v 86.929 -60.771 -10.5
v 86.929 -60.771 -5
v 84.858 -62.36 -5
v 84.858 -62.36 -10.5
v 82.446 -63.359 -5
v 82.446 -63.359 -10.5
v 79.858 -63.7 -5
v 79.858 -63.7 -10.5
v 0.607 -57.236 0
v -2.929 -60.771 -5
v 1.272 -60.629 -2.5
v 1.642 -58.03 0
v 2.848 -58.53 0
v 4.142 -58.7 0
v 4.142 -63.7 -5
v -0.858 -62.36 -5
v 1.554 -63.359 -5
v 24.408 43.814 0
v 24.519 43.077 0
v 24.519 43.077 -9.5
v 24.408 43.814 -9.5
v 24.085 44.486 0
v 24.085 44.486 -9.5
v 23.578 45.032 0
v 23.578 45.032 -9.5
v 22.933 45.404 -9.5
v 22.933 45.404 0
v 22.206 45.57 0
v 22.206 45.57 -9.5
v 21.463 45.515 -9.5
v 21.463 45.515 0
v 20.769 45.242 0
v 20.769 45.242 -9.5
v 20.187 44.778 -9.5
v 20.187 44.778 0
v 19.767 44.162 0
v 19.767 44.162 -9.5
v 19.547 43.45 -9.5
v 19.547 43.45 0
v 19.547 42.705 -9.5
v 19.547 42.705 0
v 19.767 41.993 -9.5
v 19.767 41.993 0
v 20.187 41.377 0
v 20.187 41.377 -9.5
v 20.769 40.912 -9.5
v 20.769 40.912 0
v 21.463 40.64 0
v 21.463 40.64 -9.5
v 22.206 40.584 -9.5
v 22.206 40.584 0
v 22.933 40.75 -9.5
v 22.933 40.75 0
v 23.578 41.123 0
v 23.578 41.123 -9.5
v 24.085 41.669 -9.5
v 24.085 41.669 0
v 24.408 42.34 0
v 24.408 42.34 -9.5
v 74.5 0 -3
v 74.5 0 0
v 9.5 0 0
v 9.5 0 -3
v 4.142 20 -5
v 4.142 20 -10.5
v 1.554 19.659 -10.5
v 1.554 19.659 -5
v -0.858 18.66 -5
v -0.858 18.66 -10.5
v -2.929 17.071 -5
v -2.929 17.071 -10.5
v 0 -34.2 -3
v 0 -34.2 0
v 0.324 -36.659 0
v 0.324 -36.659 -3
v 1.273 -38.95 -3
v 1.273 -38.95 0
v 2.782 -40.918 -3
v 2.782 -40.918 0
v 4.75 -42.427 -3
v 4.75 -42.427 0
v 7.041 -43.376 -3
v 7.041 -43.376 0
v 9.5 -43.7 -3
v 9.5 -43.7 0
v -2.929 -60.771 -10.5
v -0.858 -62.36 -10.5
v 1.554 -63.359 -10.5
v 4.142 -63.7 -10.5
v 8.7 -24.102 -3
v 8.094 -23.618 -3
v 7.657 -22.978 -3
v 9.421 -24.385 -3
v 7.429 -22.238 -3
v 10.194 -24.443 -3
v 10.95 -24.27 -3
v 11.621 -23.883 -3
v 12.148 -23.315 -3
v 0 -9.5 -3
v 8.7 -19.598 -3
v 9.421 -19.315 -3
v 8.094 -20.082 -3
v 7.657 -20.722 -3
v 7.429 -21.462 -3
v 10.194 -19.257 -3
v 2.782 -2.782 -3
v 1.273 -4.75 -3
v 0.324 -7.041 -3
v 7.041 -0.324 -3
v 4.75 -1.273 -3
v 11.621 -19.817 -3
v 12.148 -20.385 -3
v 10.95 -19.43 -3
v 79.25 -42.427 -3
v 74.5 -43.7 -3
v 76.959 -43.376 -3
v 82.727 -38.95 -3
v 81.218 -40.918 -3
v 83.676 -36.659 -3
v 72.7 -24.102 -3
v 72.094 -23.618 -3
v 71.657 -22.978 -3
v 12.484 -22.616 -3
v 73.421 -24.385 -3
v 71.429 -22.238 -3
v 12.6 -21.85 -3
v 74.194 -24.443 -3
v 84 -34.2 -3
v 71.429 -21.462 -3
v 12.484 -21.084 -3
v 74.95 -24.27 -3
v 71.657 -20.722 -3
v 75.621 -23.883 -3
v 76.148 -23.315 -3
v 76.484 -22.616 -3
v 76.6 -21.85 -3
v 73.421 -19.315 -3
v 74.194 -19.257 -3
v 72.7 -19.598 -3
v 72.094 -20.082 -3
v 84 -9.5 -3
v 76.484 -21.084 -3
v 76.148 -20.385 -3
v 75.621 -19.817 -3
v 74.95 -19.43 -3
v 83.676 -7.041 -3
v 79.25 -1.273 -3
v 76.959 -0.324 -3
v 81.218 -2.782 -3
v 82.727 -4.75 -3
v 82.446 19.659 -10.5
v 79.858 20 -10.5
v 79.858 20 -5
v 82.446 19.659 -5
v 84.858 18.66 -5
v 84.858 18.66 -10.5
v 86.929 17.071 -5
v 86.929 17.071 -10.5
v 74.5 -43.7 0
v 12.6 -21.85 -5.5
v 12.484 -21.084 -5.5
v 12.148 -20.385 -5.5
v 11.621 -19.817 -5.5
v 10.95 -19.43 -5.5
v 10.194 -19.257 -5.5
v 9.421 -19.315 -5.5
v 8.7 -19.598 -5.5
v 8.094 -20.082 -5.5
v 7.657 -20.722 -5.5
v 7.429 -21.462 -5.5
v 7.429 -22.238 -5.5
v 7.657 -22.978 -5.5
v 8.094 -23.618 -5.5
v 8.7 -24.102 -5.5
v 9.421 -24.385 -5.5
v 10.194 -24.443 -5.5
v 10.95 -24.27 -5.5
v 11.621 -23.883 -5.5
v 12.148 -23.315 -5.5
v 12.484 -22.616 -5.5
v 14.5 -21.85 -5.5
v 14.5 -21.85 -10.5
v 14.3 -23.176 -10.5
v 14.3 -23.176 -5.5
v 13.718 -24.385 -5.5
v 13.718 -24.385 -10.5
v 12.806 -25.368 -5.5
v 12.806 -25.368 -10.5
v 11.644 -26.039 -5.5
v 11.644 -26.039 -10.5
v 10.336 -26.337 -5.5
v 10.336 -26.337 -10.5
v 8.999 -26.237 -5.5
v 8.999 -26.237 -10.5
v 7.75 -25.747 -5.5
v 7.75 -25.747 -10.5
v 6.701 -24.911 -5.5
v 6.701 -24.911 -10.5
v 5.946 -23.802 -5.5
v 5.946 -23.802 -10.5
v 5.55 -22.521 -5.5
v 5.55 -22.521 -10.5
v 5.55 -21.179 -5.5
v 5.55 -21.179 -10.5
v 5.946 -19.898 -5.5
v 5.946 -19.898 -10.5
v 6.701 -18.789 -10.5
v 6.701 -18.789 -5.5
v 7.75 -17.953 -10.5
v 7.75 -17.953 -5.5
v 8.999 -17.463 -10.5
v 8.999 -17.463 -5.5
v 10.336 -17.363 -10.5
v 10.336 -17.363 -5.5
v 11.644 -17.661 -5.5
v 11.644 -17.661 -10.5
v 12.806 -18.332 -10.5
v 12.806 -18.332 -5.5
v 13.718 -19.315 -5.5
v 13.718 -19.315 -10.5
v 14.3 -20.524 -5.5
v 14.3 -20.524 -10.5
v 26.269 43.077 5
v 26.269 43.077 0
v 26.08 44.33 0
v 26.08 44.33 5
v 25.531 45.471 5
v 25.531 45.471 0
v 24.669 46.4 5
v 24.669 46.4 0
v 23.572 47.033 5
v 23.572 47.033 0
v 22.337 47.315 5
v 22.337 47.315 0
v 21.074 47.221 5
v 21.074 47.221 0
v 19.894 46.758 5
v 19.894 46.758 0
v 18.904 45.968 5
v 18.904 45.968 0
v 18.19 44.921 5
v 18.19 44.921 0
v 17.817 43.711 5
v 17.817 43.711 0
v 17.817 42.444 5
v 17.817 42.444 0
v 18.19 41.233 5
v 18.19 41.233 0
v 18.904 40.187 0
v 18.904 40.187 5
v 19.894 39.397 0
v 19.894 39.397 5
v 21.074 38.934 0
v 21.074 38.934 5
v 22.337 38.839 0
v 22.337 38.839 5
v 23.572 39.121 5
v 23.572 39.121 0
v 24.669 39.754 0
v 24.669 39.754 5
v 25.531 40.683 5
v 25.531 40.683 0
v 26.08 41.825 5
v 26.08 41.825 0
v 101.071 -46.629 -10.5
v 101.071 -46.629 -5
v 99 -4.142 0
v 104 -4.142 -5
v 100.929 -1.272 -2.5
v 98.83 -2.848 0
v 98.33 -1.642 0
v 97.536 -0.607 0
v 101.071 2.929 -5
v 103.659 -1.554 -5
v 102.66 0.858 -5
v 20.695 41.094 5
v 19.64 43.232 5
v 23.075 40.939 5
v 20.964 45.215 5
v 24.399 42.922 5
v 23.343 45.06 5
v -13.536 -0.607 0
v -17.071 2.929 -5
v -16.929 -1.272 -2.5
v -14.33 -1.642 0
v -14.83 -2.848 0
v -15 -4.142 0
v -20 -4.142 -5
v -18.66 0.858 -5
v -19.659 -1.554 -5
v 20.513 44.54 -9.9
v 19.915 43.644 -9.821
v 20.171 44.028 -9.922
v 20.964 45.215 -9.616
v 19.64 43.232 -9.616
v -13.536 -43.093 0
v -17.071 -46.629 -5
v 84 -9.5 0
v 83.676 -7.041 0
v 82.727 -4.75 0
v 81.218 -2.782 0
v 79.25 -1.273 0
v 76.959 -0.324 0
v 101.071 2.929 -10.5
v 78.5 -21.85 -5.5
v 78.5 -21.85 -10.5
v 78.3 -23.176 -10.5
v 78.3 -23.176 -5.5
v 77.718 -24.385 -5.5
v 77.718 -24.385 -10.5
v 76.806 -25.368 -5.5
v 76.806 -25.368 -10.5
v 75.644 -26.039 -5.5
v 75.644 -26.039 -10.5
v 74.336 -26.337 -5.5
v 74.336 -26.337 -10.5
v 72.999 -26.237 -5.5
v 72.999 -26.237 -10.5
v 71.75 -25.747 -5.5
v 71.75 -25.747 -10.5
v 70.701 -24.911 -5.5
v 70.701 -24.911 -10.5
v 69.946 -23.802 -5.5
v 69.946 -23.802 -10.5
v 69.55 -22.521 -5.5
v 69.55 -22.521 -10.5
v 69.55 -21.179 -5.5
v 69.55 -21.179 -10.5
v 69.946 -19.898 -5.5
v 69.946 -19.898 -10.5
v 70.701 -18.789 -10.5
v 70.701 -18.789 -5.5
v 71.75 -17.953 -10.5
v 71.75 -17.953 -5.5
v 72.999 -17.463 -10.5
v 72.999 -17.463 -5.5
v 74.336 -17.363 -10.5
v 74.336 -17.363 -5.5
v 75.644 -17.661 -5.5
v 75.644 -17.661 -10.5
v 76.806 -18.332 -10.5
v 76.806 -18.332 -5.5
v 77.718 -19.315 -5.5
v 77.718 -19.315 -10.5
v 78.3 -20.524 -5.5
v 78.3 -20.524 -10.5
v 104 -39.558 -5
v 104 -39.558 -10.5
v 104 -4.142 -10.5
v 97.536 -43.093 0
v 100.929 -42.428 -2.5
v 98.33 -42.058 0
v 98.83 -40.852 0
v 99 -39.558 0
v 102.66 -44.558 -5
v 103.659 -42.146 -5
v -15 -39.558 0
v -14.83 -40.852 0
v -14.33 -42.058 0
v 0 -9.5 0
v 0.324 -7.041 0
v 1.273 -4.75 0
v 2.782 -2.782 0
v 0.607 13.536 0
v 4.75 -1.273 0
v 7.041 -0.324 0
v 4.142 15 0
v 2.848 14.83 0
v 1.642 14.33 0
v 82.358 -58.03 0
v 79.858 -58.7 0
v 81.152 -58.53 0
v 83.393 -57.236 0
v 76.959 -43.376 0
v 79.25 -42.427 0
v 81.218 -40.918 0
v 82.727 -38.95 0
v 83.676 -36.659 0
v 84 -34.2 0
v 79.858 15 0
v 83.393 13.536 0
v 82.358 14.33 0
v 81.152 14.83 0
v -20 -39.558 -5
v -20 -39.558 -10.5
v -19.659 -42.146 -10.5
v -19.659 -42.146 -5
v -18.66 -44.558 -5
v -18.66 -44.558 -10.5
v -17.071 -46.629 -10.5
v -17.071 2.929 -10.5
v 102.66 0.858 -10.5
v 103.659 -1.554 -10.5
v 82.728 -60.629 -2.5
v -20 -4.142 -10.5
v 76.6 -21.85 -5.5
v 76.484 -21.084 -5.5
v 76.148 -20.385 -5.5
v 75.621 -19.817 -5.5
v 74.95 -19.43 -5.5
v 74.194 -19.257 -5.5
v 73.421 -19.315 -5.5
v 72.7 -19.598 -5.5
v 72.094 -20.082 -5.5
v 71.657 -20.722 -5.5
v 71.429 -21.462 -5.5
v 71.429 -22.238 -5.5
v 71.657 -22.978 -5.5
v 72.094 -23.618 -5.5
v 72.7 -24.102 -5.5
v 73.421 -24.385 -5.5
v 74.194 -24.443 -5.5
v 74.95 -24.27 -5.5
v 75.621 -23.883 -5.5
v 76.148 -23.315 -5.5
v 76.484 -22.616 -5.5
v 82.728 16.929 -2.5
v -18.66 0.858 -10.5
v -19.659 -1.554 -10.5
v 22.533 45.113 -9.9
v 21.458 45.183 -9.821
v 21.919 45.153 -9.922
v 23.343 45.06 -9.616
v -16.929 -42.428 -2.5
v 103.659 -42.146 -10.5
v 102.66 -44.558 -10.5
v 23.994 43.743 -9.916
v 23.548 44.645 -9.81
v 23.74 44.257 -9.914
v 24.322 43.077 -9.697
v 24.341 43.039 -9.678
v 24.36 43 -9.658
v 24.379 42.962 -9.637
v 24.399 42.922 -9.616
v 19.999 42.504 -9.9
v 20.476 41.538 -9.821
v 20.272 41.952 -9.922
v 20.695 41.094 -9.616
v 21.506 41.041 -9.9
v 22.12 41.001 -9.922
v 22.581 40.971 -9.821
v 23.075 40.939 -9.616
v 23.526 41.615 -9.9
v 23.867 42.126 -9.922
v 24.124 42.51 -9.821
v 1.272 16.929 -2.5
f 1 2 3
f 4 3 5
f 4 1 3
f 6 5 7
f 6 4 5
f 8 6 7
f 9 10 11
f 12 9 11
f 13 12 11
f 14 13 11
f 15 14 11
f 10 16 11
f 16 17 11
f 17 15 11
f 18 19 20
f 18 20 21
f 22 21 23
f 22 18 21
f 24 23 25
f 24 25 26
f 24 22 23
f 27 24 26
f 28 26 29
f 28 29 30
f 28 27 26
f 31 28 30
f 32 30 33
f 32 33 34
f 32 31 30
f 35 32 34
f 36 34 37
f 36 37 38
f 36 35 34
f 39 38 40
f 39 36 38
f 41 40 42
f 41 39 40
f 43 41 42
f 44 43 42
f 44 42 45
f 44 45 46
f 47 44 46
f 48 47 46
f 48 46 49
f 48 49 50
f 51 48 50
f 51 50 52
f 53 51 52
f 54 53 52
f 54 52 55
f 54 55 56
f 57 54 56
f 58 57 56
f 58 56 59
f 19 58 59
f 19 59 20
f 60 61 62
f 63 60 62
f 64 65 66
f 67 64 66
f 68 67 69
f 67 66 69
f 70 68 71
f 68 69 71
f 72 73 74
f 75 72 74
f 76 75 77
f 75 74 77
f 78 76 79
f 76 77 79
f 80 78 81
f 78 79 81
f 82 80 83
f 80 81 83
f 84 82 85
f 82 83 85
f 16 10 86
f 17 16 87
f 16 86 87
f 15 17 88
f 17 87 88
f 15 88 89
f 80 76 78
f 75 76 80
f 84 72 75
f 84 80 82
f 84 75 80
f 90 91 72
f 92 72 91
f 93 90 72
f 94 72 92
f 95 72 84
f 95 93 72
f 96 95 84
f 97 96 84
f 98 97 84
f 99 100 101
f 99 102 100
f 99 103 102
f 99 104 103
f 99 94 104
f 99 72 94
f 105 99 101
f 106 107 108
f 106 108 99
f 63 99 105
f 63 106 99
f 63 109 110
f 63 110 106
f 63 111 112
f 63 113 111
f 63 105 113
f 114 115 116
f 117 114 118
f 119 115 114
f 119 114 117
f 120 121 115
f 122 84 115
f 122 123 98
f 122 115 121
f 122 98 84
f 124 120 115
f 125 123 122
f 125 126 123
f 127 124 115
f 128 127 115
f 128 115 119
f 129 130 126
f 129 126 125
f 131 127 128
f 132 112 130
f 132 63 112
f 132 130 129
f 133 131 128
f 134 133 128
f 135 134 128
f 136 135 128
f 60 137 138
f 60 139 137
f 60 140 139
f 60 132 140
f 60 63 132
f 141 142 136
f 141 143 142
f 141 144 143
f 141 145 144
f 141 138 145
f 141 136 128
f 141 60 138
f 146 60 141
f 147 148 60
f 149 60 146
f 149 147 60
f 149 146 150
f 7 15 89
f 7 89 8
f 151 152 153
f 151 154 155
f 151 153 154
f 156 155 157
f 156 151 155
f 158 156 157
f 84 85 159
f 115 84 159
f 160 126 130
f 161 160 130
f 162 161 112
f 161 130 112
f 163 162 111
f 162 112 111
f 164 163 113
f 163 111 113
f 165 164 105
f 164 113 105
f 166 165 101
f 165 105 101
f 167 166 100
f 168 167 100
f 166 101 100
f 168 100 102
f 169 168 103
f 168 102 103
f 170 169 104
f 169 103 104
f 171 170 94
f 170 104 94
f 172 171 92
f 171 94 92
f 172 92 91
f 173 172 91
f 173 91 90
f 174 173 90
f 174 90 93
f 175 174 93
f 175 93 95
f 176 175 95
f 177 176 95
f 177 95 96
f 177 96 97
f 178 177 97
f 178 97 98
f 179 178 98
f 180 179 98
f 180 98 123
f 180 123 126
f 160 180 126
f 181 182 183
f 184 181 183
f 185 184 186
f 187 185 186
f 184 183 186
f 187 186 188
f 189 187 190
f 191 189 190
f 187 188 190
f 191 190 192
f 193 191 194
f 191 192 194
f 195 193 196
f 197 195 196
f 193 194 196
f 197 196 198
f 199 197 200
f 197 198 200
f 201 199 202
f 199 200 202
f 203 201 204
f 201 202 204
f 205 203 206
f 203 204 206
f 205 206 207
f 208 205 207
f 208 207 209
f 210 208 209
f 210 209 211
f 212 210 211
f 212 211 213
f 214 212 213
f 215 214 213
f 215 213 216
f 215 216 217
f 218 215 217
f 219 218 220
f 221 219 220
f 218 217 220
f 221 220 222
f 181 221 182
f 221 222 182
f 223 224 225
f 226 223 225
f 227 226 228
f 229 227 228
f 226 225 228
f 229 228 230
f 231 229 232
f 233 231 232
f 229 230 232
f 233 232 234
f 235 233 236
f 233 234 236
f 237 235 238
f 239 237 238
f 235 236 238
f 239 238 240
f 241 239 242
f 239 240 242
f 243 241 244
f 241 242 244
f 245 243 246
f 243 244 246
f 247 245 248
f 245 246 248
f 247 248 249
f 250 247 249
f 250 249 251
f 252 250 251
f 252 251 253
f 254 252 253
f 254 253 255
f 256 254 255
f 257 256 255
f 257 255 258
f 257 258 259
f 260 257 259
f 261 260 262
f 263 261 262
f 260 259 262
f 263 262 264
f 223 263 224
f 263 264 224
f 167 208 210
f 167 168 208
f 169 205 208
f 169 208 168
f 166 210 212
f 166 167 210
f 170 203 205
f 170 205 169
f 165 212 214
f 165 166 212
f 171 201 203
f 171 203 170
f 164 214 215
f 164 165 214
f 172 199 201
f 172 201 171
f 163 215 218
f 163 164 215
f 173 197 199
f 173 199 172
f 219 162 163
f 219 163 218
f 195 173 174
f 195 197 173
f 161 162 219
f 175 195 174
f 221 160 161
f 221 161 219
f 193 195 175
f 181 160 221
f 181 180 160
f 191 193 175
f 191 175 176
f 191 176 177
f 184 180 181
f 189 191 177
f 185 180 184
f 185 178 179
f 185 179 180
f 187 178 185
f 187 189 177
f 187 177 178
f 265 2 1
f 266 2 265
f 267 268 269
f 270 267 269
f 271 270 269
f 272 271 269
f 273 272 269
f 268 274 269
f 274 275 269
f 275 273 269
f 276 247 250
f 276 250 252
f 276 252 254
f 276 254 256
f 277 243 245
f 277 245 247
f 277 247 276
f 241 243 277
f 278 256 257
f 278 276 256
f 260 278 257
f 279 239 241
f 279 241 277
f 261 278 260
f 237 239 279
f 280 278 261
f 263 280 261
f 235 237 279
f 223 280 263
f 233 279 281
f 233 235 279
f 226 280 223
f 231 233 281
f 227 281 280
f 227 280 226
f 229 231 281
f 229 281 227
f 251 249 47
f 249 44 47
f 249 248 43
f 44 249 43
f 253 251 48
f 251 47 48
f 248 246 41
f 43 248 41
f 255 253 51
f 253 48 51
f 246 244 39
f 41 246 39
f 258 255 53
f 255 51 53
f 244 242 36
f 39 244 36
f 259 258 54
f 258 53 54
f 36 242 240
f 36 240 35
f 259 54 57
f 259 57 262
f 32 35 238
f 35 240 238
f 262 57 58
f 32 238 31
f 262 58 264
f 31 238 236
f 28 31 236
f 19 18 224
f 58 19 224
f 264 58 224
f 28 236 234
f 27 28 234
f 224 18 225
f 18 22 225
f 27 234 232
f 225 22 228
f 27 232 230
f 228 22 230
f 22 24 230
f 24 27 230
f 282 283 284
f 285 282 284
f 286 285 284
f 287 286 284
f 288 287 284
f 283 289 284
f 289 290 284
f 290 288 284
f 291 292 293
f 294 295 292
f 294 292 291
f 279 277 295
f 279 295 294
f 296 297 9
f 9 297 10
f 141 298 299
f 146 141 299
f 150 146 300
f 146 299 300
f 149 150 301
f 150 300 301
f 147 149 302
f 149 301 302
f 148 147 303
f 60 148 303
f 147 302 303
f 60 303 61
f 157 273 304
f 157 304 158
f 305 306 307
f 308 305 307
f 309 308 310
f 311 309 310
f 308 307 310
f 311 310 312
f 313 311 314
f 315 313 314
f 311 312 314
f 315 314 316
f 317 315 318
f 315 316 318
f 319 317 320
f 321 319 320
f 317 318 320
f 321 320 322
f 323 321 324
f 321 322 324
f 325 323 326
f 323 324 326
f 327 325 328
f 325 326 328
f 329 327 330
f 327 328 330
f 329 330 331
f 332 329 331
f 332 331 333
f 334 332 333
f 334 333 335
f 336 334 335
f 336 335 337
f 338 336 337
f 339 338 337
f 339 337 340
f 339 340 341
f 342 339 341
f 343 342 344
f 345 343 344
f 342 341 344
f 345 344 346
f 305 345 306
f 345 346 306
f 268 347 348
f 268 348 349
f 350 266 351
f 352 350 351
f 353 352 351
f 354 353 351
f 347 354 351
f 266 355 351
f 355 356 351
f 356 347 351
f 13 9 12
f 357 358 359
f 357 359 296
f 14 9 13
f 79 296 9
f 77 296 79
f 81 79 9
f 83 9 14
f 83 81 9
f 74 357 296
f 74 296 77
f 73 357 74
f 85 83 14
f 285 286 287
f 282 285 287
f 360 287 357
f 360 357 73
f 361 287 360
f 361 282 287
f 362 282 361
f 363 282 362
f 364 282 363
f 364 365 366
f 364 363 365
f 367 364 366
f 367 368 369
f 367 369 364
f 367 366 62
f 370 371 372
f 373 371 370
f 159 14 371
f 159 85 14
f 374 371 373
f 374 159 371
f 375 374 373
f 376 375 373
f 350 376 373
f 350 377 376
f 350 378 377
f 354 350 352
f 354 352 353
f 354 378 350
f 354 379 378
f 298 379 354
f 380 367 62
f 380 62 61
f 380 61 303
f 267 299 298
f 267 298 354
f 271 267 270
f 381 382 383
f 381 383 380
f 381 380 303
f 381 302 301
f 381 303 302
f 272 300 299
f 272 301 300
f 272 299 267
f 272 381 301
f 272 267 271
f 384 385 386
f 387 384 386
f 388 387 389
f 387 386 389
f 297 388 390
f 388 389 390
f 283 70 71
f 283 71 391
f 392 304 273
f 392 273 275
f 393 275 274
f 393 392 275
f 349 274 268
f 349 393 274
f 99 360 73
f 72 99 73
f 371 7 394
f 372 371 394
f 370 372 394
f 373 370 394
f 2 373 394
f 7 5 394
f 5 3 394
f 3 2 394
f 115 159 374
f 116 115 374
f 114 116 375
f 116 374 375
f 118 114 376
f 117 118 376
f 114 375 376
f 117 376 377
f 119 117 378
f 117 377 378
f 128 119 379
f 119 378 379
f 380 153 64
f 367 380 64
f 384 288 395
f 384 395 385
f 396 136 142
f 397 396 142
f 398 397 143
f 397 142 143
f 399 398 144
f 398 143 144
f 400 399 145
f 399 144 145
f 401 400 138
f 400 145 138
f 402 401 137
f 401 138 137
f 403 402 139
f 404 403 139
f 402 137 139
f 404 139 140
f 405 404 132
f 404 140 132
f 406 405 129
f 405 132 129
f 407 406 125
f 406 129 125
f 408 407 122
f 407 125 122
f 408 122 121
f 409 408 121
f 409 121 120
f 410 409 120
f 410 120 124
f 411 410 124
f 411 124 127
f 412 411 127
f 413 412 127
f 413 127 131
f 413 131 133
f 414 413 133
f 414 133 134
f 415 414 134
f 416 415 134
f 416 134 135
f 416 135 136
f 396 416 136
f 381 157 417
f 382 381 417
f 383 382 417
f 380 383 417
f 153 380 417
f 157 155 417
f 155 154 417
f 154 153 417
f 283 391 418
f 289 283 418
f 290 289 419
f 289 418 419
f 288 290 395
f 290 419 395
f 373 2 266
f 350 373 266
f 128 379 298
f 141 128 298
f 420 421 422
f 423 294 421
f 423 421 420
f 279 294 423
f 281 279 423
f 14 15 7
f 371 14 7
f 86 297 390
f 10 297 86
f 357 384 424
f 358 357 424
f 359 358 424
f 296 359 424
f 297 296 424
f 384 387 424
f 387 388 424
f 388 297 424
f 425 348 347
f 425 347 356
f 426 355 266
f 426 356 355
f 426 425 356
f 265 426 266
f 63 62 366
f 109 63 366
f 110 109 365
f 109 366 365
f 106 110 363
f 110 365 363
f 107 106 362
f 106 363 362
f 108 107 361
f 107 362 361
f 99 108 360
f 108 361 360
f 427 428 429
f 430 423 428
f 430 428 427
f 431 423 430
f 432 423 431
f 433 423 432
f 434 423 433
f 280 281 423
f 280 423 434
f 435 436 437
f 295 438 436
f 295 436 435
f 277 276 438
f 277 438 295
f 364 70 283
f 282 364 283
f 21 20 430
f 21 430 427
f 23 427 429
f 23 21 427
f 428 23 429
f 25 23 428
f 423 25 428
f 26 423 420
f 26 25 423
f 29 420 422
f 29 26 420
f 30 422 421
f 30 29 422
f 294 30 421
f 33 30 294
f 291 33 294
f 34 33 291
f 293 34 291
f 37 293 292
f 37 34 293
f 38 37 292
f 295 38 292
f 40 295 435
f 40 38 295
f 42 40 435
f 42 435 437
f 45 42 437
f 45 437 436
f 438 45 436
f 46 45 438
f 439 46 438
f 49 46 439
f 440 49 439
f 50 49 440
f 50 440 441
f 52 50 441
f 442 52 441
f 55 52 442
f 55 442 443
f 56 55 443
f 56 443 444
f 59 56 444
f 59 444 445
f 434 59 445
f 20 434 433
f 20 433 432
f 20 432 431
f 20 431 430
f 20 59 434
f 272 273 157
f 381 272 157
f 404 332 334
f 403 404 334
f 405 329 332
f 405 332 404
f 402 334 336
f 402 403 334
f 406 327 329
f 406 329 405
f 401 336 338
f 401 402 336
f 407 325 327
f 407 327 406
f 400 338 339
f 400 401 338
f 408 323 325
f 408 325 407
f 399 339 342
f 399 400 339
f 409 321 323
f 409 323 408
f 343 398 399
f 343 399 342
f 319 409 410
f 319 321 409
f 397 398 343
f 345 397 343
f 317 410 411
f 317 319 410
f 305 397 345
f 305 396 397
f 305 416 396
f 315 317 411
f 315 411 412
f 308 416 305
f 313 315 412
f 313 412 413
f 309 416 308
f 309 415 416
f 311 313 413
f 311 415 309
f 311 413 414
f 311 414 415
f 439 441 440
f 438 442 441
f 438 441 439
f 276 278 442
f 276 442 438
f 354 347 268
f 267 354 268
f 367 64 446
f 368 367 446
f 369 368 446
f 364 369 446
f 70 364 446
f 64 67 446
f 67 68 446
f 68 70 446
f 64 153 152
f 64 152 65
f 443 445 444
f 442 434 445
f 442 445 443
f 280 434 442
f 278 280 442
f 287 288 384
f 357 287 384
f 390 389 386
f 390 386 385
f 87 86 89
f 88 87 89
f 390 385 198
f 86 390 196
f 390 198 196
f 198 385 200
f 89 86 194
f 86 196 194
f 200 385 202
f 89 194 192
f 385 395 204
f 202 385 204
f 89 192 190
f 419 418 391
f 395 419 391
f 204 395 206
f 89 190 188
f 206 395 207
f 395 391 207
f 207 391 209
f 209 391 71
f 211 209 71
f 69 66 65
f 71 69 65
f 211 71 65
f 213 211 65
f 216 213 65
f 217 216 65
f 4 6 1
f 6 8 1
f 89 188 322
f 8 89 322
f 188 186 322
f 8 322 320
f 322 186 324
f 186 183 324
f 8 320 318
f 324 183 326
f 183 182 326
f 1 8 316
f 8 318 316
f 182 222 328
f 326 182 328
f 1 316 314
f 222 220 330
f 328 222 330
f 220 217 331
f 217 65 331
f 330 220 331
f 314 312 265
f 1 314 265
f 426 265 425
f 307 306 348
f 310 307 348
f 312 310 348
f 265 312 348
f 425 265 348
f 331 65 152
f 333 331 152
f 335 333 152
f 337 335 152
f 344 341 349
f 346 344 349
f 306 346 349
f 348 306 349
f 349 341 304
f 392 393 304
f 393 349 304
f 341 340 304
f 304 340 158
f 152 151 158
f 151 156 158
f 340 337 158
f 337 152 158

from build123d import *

# Parameters (mm, degrees)
F0_R     = 2.6
F1_DEPTH = 10.5
F2_DEPTH = 3
F3_R     = 10
F4_SIZE  = 5
F5_R     = 4.5
F6_DEPTH = 5
F0_R_2   = 4.25
F0_R_3   = 2.5
F7_DEPTH = 5
F8_DEPTH = 10


# Not quite as in the source:
# - a fillet or chamfer that OpenCascade refuses, or shapes differently, is made with other operations: its cross-section is extruded or revolved along the edge and cut away or added


with BuildPart() as f1:
    # F0 (on Top) → F1 (new body)
    with BuildSketch(Plane.XY):
        Polygon((84, 20), (0, 20), (-20, 0), (-20, -43.7), (0, -63.7), (84, -63.7), (104, -43.7), (104, 0), align=None)
        with BuildLine():
            Line((74.5, -43.7), (9.5, -43.7))
            ThreePointArc((9.5, -43.7), (2.7824855787, -40.9175144213), (0, -34.2))
            Line((0, -34.2), (0, -9.5))
            ThreePointArc((0, -9.5), (2.7824855787, -2.7824855787), (9.5, 0))
            Line((9.5, 0), (74.5, 0))
            ThreePointArc((74.5, 0), (81.2175144213, -2.7824855787), (84, -9.5))
            Line((84, -9.5), (84, -34.2))
            ThreePointArc((84, -34.2), (81.2175144213, -40.9175144213), (74.5, -43.7))
        make_face(mode=Mode.SUBTRACT)
        with BuildLine():
            ThreePointArc((0, -34.2), (2.7824855787, -40.9175144213), (9.5, -43.7))
            Line((9.5, -43.7), (74.5, -43.7))
            ThreePointArc((74.5, -43.7), (81.2175144213, -40.9175144213), (84, -34.2))
            Line((84, -34.2), (84, -9.5))
            ThreePointArc((84, -9.5), (81.2175144213, -2.7824855787), (74.5, 0))
            Line((74.5, 0), (9.5, 0))
            ThreePointArc((9.5, 0), (2.7824855787, -2.7824855787), (0, -9.5))
            Line((0, -9.5), (0, -34.2))
        make_face()
        with Locations((10, -21.85)):
            Circle(F0_R, mode=Mode.SUBTRACT)
        with Locations((74, -21.85)):
            Circle(F0_R, mode=Mode.SUBTRACT)
    extrude(amount=-F1_DEPTH)

    # F0 (on Top) → F2 (cut)
    with BuildSketch(Plane.XY):
        with BuildLine():
            ThreePointArc((0, -34.2), (2.7824855787, -40.9175144213), (9.5, -43.7))
            Line((9.5, -43.7), (74.5, -43.7))
            ThreePointArc((74.5, -43.7), (81.2175144213, -40.9175144213), (84, -34.2))
            Line((84, -34.2), (84, -9.5))
            ThreePointArc((84, -9.5), (81.2175144213, -2.7824855787), (74.5, 0))
            Line((74.5, 0), (9.5, 0))
            ThreePointArc((9.5, 0), (2.7824855787, -2.7824855787), (0, -9.5))
            Line((0, -9.5), (0, -34.2))
        make_face()
        with Locations((10, -21.85)):
            Circle(F0_R, mode=Mode.SUBTRACT)
        with Locations((74, -21.85)):
            Circle(F0_R, mode=Mode.SUBTRACT)
    extrude(amount=-F2_DEPTH, mode=Mode.SUBTRACT)

    # F3
    f3_edges = [f1.edges().sort_by_distance(p)[0] for p in [
        (0, 20, -5.25),
        (-20, 0, -5.25),
        (-20, -43.7, -5.25),
        (0, -63.7, -5.25),
        (84, -63.7, -5.25),
        (104, -43.7, -5.25),
        (104, 0, -5.25),
        (84, 20, -5.25),
    ]]
    fillet(f3_edges, radius=F3_R)

    # F4
    f4_edges = [f1.edges().sort_by_distance(p)[0] for p in [
        (42, -63.7, 0),
    ]]
    chamfer(f4_edges, length=F4_SIZE)

    # F5 (on face) → F6 (cut)
    with BuildSketch(Plane(origin=(0, 0, -10.5), x_dir=(1, 0, 0), z_dir=(0, 0, -1))):
        with Locations((74, 21.85)):
            Circle(F5_R)
        with Locations((10, 21.85)):
            Circle(F5_R)
    extrude(amount=-F6_DEPTH, mode=Mode.SUBTRACT)


with BuildPart() as f7:
    # F0 (on Top) → F7 (new body)
    with BuildSketch(Plane.XY):
        with Locations((22.0192523188, 43.0772615533)):
            Circle(F0_R_2)
        with Locations((22.0192523188, 43.0772615533)):
            Circle(F0_R_3, mode=Mode.SUBTRACT)
        with Locations((22.0192523188, 43.0772615533)):
            Circle(F0_R_3)
        Polygon((20.9636902895, 45.2153499835), (23.3431102003, 45.0604493011), (24.3986722296, 42.9223608708), (23.0748143481, 40.939173123), (20.6953944373, 41.0940738055), (19.639832408, 43.2321622357), align=None, mode=Mode.SUBTRACT)
    extrude(amount=F7_DEPTH)

    # F0 (on Top) → F8 (join)
    with BuildSketch(Plane.XY):
        with Locations((22.0192523188, 43.0772615533)):
            Circle(F0_R_3)
        Polygon((20.9636902895, 45.2153499835), (23.3431102003, 45.0604493011), (24.3986722296, 42.9223608708), (23.0748143481, 40.939173123), (20.6953944373, 41.0940738055), (19.639832408, 43.2321622357), align=None, mode=Mode.SUBTRACT)
    extrude(amount=-F8_DEPTH)

    # F9: chamfer of 0.5 on 1 edges, made by hand

    # F9_s1 → F9_t2 (revolve, cut)
    with BuildSketch(Plane.XZ.offset(-43.0772615533)):
        Polygon((24.0192523188, -10), (24.5192523188, -9.5), (24.5192523188, -10), align=None)
    revolve(axis=Axis((22.0192523188, 43.0772615533, -10), (0, 0, 1)), mode=Mode.SUBTRACT)


solid = Compound([f1.part, f7.part])
